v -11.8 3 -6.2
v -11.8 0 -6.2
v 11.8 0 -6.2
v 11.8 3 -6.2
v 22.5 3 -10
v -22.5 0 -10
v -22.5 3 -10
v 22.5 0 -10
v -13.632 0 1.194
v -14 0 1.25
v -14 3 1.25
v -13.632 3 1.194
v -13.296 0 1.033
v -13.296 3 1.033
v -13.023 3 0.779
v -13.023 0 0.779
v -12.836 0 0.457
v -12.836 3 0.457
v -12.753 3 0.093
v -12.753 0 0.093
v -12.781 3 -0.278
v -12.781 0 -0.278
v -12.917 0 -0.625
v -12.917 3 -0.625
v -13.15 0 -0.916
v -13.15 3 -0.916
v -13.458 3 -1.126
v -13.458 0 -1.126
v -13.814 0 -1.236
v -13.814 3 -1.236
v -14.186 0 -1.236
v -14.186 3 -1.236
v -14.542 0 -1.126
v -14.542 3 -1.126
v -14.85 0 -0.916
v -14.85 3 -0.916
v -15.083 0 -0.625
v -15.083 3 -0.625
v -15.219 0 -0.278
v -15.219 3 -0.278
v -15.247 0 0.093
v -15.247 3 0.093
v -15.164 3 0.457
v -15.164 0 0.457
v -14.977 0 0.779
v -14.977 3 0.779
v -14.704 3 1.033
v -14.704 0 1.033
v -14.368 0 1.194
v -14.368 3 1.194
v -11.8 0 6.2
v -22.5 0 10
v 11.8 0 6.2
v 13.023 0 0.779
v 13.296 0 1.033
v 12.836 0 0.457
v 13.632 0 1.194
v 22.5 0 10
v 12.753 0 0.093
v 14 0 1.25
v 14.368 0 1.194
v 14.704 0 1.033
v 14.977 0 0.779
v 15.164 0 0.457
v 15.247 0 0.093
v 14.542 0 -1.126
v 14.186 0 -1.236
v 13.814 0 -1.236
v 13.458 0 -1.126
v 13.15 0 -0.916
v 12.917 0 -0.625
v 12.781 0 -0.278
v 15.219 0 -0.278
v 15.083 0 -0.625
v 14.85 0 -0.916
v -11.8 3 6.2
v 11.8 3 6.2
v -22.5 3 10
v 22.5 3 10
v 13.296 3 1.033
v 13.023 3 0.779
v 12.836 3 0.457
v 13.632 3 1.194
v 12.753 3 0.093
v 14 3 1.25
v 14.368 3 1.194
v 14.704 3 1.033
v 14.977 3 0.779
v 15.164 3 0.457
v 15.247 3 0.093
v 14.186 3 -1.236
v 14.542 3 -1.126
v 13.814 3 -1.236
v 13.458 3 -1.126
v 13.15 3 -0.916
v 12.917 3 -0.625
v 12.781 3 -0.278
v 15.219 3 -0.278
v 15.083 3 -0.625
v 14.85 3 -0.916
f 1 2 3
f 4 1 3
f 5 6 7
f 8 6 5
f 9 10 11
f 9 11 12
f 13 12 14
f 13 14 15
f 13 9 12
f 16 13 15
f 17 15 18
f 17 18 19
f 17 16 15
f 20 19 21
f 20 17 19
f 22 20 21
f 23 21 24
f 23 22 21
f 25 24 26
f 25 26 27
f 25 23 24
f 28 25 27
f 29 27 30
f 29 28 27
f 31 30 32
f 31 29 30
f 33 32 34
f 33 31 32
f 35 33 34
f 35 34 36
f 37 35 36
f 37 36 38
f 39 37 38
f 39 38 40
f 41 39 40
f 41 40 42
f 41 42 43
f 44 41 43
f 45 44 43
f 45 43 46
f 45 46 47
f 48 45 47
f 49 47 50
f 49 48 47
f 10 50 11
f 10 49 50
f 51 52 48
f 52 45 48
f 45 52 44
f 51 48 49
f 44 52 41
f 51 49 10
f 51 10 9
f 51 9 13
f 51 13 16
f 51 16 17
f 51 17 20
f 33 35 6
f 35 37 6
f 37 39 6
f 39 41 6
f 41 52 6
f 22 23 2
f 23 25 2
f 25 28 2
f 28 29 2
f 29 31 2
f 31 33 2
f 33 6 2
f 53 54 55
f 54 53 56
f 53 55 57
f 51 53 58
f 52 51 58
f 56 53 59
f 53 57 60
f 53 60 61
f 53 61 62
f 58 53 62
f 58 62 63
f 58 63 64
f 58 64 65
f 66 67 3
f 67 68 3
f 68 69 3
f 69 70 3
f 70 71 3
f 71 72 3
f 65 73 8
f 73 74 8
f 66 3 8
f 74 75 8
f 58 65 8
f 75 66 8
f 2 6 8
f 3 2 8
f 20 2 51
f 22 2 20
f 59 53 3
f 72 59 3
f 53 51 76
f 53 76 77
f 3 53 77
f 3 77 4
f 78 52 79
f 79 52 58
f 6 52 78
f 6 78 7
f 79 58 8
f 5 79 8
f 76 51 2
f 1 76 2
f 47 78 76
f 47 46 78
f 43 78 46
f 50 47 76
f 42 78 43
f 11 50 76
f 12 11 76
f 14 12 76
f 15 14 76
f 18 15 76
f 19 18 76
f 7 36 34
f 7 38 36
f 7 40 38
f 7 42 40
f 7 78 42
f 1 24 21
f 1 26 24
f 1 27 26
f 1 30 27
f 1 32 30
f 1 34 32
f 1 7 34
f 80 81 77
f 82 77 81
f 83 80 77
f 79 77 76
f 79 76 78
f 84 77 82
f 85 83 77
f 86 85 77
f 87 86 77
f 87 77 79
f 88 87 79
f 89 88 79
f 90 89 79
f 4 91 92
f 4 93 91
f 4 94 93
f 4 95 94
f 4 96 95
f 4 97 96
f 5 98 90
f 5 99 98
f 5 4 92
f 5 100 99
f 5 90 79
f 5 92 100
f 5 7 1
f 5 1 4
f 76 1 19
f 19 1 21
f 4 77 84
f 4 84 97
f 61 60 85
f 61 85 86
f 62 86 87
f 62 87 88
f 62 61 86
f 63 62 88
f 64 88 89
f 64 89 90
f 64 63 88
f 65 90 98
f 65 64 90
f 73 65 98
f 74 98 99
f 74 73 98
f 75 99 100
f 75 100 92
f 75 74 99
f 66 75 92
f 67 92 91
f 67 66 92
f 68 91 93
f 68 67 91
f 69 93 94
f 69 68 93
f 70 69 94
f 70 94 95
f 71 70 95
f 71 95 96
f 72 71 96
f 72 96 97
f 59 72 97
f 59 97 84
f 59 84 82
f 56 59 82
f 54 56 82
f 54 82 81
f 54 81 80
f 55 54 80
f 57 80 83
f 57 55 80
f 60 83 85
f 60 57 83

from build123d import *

# Parameters (mm, degrees)
CROQUIS1_W              = 45
CROQUIS1_H              = 20
CROQUIS1_R              = 1.25
CROQUIS1_W_2            = 23.6
CROQUIS1_H_2            = 12.4
SALIENTE_EXTRUIR1_DEPTH = 3


with BuildPart() as part:
    # Croquis1 → Saliente-Extruir1 (new body)
    with BuildSketch(Plane(origin=(0, 0, 0), x_dir=(1, 0, 0), z_dir=(0, 1, 0))):
        Rectangle(CROQUIS1_W, CROQUIS1_H)
        with Locations(Location((14, 0, 0), (0, 0, 270))):
            Circle(CROQUIS1_R, mode=Mode.SUBTRACT)
        with Locations(Location((-14, 0, 0), (0, 0, 270))):
            Circle(CROQUIS1_R, mode=Mode.SUBTRACT)
        Rectangle(CROQUIS1_W_2, CROQUIS1_H_2, mode=Mode.SUBTRACT)
    extrude(amount=SALIENTE_EXTRUIR1_DEPTH)


solid = part.part
